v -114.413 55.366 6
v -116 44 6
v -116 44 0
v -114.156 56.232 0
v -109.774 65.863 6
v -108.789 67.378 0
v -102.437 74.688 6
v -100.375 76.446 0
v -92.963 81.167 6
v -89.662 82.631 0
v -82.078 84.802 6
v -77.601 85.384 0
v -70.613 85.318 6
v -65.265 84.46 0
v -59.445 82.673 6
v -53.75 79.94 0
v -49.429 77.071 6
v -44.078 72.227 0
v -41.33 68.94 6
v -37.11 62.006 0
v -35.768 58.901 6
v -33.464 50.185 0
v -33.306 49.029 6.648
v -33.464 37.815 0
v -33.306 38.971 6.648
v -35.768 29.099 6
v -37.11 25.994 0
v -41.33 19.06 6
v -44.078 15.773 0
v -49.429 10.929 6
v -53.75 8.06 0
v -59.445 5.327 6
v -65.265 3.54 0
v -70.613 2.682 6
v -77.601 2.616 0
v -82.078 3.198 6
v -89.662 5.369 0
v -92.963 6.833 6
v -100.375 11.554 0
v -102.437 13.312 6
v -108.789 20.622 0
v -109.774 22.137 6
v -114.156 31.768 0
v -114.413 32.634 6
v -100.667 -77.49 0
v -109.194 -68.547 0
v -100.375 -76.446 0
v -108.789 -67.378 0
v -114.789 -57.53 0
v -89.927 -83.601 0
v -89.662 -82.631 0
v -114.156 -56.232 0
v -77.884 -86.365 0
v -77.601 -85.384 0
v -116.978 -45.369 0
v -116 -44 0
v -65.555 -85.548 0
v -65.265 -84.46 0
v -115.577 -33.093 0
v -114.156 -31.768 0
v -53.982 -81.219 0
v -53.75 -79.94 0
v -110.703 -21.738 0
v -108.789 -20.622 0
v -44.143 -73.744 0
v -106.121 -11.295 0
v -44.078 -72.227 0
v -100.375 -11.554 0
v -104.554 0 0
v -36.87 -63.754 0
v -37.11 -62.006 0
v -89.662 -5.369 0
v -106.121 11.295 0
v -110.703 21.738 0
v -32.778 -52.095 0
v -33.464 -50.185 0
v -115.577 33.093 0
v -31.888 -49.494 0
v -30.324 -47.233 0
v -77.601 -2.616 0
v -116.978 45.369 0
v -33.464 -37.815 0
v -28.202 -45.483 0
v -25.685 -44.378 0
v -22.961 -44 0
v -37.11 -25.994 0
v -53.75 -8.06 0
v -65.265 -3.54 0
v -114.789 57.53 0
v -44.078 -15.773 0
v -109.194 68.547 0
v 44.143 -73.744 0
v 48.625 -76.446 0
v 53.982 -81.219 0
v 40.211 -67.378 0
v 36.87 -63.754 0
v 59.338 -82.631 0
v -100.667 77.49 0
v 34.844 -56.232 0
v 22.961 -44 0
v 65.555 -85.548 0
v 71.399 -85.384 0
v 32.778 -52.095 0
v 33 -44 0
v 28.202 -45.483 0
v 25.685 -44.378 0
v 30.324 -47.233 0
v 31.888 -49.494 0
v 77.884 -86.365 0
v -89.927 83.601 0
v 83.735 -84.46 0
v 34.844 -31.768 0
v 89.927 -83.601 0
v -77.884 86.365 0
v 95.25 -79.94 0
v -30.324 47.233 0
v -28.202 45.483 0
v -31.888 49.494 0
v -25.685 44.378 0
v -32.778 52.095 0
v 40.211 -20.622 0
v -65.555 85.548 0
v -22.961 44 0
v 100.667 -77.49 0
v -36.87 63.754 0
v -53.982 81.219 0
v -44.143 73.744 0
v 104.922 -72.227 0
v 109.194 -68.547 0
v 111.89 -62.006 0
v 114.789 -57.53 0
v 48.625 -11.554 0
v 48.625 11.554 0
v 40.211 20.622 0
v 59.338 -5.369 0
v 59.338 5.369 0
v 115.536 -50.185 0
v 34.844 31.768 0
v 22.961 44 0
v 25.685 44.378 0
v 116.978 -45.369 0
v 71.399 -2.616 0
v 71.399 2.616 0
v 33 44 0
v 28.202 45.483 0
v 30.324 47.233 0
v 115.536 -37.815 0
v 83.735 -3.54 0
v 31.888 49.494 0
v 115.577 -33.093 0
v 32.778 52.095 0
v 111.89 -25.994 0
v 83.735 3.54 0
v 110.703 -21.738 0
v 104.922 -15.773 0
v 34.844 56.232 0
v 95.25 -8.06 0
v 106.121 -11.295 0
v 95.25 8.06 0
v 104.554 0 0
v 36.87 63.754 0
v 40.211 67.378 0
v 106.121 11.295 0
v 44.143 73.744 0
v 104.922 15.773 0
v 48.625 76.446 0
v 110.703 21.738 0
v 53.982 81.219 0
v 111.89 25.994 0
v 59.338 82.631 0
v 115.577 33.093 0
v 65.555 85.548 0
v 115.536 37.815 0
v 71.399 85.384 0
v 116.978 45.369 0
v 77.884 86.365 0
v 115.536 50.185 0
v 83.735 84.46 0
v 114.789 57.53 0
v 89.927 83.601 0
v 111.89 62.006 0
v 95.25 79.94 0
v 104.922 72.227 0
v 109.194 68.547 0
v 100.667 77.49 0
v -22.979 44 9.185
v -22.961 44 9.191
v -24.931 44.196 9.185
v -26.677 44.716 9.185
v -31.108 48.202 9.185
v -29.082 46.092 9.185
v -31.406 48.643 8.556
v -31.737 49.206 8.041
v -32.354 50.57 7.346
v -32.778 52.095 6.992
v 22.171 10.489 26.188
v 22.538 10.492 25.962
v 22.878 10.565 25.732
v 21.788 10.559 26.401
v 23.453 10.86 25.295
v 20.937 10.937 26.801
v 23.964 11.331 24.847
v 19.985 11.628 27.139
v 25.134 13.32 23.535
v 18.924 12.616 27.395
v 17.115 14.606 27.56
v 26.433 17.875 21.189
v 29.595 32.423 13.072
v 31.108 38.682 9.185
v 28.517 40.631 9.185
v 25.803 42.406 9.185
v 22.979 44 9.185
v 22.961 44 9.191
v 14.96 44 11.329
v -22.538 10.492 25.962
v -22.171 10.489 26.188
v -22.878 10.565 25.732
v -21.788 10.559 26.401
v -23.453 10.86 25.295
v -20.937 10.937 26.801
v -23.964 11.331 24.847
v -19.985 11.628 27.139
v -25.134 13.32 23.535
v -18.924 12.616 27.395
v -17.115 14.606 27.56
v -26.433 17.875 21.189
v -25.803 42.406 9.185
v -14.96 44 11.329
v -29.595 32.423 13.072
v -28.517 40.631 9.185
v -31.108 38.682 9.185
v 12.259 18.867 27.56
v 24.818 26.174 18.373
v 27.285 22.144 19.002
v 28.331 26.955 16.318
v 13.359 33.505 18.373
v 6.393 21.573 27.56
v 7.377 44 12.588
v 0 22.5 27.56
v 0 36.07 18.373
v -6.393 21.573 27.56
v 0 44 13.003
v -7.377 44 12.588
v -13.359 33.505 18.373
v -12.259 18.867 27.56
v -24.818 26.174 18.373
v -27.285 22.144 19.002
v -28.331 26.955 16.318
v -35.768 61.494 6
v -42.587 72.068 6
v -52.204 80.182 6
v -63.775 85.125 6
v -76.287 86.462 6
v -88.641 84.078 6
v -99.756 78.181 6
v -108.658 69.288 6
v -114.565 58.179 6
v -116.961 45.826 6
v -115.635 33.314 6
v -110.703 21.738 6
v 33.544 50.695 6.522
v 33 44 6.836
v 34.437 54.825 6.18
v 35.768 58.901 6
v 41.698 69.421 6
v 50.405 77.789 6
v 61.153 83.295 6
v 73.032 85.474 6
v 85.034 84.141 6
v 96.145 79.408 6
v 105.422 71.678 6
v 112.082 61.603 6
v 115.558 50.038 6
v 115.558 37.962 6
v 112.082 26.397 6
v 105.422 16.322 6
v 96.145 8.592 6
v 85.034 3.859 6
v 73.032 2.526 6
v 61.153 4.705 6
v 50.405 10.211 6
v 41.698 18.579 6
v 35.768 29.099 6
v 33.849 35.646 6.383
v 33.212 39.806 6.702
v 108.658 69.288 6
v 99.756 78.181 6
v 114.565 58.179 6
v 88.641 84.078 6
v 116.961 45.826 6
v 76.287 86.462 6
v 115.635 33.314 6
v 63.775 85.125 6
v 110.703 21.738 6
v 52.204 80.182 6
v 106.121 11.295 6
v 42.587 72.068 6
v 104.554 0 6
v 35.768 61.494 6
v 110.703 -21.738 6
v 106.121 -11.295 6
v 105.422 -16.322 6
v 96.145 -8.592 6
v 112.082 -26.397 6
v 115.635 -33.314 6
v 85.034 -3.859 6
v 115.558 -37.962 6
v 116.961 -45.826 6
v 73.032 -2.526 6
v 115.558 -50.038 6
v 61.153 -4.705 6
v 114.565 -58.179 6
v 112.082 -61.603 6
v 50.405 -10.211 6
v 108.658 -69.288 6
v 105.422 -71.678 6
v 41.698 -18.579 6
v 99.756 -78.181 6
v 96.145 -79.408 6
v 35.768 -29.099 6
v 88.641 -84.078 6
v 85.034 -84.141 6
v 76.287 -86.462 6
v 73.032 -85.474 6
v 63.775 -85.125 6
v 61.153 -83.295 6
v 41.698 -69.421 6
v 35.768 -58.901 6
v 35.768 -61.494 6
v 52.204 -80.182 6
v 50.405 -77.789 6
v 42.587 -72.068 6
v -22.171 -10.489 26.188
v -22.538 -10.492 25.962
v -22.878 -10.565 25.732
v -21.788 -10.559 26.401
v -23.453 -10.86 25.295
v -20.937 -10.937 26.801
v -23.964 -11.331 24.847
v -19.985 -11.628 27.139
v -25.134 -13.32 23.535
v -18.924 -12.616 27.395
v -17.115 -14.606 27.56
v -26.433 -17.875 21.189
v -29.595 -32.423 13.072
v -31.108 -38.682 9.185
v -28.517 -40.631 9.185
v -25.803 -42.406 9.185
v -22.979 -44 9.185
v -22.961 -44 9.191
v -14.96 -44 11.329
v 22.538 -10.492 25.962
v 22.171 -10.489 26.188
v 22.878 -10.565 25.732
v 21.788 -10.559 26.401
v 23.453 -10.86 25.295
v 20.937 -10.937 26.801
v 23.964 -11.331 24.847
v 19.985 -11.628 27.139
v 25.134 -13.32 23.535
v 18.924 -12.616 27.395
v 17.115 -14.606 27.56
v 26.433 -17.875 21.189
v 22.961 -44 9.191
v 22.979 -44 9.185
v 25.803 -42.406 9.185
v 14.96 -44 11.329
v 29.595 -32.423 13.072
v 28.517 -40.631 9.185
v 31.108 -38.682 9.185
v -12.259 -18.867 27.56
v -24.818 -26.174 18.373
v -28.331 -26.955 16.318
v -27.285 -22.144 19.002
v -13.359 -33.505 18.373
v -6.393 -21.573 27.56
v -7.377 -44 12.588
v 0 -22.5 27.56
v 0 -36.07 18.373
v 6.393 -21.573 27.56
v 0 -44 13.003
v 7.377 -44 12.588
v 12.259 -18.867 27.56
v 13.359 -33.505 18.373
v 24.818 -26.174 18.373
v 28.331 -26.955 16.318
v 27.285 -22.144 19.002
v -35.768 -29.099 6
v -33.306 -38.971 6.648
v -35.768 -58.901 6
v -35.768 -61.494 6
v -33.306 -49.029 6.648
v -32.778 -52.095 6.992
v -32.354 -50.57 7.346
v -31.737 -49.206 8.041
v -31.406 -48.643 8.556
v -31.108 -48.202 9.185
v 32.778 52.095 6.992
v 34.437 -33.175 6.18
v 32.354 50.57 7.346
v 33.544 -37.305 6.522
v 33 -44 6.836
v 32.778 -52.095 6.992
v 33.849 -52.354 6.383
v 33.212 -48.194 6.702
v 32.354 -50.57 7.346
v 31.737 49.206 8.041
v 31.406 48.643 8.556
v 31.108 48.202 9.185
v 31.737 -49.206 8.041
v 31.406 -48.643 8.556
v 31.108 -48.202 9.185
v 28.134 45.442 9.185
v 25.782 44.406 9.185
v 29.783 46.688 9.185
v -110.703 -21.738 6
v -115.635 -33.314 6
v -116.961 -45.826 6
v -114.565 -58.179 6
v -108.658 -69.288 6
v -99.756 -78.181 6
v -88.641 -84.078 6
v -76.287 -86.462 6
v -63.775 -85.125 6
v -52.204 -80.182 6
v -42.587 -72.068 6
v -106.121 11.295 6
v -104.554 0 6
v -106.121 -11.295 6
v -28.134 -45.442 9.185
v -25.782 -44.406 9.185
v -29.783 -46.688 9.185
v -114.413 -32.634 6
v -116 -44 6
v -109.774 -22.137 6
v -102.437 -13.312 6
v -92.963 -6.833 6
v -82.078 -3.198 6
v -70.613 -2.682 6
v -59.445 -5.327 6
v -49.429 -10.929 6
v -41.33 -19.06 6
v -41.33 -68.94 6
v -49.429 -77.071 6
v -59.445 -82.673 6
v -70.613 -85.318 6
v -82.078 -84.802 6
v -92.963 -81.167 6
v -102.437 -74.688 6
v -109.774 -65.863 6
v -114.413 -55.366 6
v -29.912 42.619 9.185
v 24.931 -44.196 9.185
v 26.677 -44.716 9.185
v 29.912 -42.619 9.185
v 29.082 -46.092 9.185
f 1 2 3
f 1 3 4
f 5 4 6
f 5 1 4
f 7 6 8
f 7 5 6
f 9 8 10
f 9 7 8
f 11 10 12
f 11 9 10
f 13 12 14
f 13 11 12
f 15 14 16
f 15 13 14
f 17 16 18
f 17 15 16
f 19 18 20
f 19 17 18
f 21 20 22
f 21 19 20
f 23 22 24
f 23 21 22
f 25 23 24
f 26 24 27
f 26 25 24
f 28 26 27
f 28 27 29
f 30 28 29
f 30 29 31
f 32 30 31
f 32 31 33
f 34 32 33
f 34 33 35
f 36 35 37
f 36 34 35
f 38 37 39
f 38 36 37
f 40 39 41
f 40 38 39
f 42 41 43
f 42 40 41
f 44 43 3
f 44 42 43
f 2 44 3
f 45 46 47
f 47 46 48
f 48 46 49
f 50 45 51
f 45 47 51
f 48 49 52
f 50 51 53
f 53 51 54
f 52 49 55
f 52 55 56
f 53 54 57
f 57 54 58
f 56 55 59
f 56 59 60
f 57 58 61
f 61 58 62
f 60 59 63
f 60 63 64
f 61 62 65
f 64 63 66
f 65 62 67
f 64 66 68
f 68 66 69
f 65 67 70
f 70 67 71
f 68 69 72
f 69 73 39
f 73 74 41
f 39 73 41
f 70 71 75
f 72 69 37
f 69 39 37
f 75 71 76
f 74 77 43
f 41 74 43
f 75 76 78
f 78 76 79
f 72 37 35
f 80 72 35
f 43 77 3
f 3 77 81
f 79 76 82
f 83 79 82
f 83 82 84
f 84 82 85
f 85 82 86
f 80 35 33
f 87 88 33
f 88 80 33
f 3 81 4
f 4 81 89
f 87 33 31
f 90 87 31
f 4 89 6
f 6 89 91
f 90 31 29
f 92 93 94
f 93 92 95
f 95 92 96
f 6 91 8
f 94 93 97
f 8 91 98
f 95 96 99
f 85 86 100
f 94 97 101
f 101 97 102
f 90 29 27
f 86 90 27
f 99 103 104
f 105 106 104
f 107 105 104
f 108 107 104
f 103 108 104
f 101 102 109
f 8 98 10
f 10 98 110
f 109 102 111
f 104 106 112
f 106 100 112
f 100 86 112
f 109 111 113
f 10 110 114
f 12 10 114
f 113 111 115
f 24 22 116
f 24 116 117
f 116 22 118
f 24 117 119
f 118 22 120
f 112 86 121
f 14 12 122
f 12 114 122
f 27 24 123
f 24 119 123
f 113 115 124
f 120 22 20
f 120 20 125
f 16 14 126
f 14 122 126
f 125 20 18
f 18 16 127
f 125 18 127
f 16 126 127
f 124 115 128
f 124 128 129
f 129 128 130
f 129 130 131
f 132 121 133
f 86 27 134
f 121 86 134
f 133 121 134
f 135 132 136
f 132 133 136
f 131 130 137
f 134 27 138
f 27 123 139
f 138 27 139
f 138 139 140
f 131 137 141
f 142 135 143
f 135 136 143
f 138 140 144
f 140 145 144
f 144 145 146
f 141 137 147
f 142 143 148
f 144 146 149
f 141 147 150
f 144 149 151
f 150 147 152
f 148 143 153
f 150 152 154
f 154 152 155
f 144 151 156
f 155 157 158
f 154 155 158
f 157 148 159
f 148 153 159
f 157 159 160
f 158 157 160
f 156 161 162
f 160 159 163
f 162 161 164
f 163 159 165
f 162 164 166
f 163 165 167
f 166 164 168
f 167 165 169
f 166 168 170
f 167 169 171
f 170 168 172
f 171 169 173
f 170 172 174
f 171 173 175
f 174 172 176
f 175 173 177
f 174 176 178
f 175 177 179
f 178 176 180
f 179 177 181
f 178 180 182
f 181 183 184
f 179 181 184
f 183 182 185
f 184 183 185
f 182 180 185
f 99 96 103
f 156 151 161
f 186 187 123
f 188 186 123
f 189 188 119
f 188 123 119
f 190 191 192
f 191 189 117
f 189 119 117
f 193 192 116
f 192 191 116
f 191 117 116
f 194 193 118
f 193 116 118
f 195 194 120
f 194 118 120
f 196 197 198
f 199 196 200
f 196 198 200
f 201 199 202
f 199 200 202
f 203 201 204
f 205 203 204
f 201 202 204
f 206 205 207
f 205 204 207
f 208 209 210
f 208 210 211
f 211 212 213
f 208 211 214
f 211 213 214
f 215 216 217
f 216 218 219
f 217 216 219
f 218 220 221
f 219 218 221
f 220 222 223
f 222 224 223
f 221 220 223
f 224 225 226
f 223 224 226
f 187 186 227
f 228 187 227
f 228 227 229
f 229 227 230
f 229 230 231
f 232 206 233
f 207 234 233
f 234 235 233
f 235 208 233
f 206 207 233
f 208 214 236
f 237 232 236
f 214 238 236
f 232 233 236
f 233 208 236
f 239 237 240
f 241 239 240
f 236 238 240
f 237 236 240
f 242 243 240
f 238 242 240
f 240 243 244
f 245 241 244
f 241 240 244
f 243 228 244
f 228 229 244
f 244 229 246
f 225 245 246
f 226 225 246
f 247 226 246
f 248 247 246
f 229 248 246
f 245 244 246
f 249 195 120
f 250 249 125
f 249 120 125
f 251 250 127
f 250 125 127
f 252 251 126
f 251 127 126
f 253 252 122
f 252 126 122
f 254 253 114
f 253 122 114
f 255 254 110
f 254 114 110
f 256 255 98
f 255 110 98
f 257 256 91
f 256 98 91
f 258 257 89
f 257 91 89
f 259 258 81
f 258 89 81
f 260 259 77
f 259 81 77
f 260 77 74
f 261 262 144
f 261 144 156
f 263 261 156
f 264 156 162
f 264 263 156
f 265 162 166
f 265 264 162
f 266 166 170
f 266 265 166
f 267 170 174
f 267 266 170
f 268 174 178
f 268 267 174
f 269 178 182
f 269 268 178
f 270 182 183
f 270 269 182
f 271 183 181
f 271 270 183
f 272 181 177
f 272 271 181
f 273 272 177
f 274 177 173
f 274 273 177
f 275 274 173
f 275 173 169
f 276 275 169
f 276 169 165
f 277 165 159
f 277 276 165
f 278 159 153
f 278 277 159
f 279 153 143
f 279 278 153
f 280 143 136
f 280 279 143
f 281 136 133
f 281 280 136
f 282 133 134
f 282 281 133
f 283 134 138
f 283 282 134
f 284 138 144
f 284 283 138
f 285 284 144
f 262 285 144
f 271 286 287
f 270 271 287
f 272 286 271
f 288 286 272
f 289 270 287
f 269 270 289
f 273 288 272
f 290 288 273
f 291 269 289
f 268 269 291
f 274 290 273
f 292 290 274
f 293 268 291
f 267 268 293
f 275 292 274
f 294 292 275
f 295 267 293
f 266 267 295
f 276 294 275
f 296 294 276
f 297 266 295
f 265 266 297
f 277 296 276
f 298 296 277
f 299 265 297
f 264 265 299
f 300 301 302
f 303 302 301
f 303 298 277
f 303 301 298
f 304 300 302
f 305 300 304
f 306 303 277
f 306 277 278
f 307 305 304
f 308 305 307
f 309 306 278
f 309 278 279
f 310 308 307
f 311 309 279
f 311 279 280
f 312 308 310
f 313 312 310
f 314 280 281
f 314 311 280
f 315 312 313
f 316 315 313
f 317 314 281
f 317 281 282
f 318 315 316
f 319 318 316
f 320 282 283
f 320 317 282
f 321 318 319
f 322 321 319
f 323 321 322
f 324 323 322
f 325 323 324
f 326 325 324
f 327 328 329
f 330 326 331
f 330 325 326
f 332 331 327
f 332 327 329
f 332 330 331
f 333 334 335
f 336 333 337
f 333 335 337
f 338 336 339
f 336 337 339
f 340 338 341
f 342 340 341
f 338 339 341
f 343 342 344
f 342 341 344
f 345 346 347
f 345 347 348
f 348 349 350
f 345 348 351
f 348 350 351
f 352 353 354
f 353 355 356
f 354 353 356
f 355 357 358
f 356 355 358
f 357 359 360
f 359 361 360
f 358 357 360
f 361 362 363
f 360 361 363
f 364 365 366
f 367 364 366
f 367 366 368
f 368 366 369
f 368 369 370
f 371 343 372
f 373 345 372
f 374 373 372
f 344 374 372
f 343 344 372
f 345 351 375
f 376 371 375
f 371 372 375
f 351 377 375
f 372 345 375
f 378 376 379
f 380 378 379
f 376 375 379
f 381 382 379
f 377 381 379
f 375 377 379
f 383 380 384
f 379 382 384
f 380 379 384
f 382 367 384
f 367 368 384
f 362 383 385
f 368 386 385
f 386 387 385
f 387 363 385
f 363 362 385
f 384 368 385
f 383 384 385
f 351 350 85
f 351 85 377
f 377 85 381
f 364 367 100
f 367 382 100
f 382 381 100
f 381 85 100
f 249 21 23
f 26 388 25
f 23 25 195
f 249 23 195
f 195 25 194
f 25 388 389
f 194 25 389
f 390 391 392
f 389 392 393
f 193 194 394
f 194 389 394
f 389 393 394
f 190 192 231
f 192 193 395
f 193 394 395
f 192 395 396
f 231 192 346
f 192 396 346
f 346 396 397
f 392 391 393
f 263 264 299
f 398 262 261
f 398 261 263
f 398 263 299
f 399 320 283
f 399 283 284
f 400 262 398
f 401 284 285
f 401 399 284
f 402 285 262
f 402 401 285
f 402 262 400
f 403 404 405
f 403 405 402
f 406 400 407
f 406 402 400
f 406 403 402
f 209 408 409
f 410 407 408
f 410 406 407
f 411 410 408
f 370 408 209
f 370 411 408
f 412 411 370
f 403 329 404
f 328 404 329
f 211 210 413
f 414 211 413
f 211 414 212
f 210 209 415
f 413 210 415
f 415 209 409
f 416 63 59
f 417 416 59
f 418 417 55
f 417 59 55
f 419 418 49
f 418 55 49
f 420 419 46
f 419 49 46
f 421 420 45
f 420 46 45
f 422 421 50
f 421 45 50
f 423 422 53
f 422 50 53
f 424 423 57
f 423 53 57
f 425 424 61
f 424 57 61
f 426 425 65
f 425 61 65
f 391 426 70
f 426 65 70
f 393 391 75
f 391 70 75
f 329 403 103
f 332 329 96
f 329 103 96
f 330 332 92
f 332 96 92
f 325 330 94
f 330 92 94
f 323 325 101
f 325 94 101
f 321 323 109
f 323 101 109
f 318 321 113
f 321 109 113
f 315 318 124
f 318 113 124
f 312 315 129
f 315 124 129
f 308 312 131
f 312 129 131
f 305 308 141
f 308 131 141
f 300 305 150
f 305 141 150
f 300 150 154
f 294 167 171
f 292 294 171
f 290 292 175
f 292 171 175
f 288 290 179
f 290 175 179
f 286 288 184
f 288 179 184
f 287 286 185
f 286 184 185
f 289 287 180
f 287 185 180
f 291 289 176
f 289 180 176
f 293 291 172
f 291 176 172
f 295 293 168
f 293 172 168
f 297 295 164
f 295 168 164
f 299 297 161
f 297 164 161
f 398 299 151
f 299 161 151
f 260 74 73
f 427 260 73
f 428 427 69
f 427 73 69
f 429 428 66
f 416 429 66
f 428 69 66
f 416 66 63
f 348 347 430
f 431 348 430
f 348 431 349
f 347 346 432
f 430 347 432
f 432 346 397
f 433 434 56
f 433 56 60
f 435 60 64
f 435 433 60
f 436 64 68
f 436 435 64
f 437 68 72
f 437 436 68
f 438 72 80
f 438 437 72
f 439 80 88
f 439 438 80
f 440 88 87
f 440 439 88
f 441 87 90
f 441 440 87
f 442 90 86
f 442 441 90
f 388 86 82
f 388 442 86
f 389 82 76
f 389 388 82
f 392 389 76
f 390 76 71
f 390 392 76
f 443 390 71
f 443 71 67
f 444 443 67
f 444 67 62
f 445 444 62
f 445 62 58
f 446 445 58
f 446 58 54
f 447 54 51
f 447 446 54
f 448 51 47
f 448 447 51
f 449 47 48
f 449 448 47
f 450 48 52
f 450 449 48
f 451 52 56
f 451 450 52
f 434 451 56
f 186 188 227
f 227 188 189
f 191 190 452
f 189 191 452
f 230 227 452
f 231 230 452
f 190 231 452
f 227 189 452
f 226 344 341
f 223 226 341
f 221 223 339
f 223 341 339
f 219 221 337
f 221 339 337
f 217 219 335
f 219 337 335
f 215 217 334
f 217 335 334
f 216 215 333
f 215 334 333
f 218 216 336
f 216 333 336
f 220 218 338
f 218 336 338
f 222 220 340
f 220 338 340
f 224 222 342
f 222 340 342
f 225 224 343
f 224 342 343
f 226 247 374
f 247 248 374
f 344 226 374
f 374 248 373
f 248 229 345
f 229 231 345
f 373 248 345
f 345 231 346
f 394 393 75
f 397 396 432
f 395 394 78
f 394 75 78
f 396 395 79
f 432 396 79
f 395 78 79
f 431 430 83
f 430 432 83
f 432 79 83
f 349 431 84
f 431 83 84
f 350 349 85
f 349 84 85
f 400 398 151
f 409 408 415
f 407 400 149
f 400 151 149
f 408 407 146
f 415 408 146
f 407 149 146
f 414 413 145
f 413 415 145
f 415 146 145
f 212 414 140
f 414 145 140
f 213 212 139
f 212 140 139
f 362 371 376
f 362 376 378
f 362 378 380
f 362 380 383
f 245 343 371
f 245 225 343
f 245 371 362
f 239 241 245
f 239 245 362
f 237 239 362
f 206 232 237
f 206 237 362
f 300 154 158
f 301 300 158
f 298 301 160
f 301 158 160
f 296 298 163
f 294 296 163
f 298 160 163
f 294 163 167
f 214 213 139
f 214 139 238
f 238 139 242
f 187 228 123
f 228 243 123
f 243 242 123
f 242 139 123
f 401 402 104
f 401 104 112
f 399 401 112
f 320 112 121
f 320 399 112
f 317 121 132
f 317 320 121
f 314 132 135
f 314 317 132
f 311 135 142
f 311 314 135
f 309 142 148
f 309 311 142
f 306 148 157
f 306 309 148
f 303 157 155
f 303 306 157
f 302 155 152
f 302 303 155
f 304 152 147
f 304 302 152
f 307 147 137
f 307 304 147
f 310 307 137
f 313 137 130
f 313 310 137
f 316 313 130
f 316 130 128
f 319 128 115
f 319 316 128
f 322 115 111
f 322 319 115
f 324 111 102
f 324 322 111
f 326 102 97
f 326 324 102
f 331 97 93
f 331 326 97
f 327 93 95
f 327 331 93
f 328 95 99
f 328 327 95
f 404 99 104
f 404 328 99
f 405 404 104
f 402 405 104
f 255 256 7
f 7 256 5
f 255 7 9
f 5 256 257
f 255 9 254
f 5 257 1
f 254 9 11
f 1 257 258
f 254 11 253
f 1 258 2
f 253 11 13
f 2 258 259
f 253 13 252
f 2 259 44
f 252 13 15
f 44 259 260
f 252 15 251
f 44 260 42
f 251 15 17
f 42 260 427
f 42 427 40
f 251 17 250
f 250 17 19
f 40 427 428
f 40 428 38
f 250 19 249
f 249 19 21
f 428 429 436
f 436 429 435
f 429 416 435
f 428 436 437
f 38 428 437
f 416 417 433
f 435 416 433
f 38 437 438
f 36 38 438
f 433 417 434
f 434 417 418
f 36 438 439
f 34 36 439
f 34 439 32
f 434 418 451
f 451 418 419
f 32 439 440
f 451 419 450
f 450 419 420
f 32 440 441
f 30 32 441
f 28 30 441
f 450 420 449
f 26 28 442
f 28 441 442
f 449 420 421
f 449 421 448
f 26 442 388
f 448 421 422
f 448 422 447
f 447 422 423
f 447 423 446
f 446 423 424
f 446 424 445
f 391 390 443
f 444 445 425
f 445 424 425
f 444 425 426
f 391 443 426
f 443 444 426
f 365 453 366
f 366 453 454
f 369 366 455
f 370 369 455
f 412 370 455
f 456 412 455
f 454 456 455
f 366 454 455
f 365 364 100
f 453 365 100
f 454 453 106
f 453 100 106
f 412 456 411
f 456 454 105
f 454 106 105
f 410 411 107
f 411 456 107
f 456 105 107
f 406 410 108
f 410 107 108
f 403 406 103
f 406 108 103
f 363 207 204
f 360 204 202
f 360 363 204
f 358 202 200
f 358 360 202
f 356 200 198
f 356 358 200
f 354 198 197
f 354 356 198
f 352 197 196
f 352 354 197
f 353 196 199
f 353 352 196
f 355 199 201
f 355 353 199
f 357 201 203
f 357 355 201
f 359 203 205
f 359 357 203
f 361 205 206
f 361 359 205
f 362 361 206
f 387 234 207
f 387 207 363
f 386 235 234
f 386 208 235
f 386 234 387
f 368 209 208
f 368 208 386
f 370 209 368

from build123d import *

# Parameters (mm, degrees)
BOSS_EXTRUDE1_DEPTH     = 27.56
CUT_EXTRUDE1_DEPTH      = 149.090525018
CUT_EXTRUDE1_DEPTH_BACK = 149.090525018
CUT_EXTRUDE2_DEPTH      = 149.090525174
CUT_EXTRUDE2_DEPTH_BACK = 149.090525174
SKETCH3_R               = 41.5


with BuildPart() as part:
    # Sketch1 → Boss-Extrude1 (new body)
    with BuildSketch(Plane.XY):
        with BuildLine():
            Line((22.96117968, 44), (-22.96117968, 44))
            ThreePointArc((-22.96117968, 44), (-29.323269783, 46.284832502), (-32.778097836, 52.095238095))
            ThreePointArc((-32.778097836, 52.095238095), (-89.927364847, 83.601091069), (-110.70300535, 21.738095238))
            ThreePointArc((-110.70300535, 21.738095238), (-104.55417528, 0), (-110.70300535, -21.738095238))
            ThreePointArc((-110.70300535, -21.738095238), (-89.927364847, -83.601091069), (-32.778097836, -52.095238095))
            ThreePointArc((-32.778097836, -52.095238095), (-29.323269783, -46.284832502), (-22.96117968, -44))
            Line((-22.96117968, -44), (22.96117968, -44))
            ThreePointArc((22.96117968, -44), (29.323269783, -46.284832502), (32.778097836, -52.095238095))
            ThreePointArc((32.778097836, -52.095238095), (89.927364847, -83.601091069), (110.70300535, -21.738095238))
            ThreePointArc((110.70300535, -21.738095238), (104.55417528, 0), (110.70300535, 21.738095238))
            ThreePointArc((110.70300535, 21.738095238), (89.927364847, 83.601091069), (32.778097836, 52.095238095))
            ThreePointArc((32.778097836, 52.095238095), (29.323269783, 46.284832502), (22.96117968, 44))
        make_face()
    extrude(amount=BOSS_EXTRUDE1_DEPTH)

    # Sketch2 → Cut-Extrude1 (cut, two sides: drawn at the far end of the back side and taken through both)
    with BuildSketch(Plane(origin=(0, 0, 0), x_dir=(1, 0, 0), z_dir=(0, 1, 0)).offset(-CUT_EXTRUDE1_DEPTH_BACK)):
        with BuildLine():
            Line((117, -6), (35.767564174, -6))
            ThreePointArc((35.767564174, -6), (32.945610035, -6.872461407), (31.108474327, -9.185370066))
            Line((31.108474327, -9.185370066), (26.433179694, -21.189259868))
            ThreePointArc((26.433179694, -21.189259868), (22.758908279, -25.815077185), (17.115, -27.56))
            Line((17.115, -27.56), (117, -27.56))
            Line((117, -27.56), (117, -6))
        make_face()
        with BuildLine():
            Line((-117, -27.56), (-117, -6))
            Line((-117, -6), (-35.767564174, -6))
            ThreePointArc((-35.767564174, -6), (-32.945610035, -6.872461407), (-31.108474327, -9.185370066))
            Line((-31.108474327, -9.185370066), (-26.433179694, -21.189259868))
            ThreePointArc((-26.433179694, -21.189259868), (-22.758908279, -25.815077185), (-17.115, -27.56))
            Line((-17.115, -27.56), (-117, -27.56))
        make_face()
    extrude(amount=CUT_EXTRUDE1_DEPTH + CUT_EXTRUDE1_DEPTH_BACK, mode=Mode.SUBTRACT)

    # Sketch3 → Cut-Extrude2 (cut, two sides: drawn at the far end of the back side and taken through both)
    with BuildSketch(Plane(origin=(0, 0, 0), x_dir=(-1, 0, 0), z_dir=(0, 0, -1)).offset(-CUT_EXTRUDE2_DEPTH_BACK)):
        with Locations((-74.5, 44)):
            Circle(SKETCH3_R)
        with Locations((-74.5, -44)):
            Circle(SKETCH3_R)
        with Locations((74.5, 44)):
            Circle(SKETCH3_R)
        with Locations((74.5, -44)):
            Circle(SKETCH3_R)
    extrude(amount=CUT_EXTRUDE2_DEPTH + CUT_EXTRUDE2_DEPTH_BACK, mode=Mode.SUBTRACT)

    # Cut-Sweep1: sweep along a path in Sketch4
    with BuildLine(Plane.XY.offset(27.56)) as cut_sweep1_path:
        CenterArc((0, 0), 22.5, 0, 360)
    # Sketch5 → Cut-Sweep1 (sweep, cut)
    with BuildSketch(Plane(origin=(0, 0, 0), x_dir=(0, 0, -1), z_dir=(1, 0, 0))):
        Polygon((-27.56, 22.5), (-9.185370066, 49.639215001), (-9.185370066, 86.5), (-27.56, 86.5), (-27.56, 48.201587292), align=None)
    sweep(path=cut_sweep1_path.line, mode=Mode.SUBTRACT)


solid = part.part
